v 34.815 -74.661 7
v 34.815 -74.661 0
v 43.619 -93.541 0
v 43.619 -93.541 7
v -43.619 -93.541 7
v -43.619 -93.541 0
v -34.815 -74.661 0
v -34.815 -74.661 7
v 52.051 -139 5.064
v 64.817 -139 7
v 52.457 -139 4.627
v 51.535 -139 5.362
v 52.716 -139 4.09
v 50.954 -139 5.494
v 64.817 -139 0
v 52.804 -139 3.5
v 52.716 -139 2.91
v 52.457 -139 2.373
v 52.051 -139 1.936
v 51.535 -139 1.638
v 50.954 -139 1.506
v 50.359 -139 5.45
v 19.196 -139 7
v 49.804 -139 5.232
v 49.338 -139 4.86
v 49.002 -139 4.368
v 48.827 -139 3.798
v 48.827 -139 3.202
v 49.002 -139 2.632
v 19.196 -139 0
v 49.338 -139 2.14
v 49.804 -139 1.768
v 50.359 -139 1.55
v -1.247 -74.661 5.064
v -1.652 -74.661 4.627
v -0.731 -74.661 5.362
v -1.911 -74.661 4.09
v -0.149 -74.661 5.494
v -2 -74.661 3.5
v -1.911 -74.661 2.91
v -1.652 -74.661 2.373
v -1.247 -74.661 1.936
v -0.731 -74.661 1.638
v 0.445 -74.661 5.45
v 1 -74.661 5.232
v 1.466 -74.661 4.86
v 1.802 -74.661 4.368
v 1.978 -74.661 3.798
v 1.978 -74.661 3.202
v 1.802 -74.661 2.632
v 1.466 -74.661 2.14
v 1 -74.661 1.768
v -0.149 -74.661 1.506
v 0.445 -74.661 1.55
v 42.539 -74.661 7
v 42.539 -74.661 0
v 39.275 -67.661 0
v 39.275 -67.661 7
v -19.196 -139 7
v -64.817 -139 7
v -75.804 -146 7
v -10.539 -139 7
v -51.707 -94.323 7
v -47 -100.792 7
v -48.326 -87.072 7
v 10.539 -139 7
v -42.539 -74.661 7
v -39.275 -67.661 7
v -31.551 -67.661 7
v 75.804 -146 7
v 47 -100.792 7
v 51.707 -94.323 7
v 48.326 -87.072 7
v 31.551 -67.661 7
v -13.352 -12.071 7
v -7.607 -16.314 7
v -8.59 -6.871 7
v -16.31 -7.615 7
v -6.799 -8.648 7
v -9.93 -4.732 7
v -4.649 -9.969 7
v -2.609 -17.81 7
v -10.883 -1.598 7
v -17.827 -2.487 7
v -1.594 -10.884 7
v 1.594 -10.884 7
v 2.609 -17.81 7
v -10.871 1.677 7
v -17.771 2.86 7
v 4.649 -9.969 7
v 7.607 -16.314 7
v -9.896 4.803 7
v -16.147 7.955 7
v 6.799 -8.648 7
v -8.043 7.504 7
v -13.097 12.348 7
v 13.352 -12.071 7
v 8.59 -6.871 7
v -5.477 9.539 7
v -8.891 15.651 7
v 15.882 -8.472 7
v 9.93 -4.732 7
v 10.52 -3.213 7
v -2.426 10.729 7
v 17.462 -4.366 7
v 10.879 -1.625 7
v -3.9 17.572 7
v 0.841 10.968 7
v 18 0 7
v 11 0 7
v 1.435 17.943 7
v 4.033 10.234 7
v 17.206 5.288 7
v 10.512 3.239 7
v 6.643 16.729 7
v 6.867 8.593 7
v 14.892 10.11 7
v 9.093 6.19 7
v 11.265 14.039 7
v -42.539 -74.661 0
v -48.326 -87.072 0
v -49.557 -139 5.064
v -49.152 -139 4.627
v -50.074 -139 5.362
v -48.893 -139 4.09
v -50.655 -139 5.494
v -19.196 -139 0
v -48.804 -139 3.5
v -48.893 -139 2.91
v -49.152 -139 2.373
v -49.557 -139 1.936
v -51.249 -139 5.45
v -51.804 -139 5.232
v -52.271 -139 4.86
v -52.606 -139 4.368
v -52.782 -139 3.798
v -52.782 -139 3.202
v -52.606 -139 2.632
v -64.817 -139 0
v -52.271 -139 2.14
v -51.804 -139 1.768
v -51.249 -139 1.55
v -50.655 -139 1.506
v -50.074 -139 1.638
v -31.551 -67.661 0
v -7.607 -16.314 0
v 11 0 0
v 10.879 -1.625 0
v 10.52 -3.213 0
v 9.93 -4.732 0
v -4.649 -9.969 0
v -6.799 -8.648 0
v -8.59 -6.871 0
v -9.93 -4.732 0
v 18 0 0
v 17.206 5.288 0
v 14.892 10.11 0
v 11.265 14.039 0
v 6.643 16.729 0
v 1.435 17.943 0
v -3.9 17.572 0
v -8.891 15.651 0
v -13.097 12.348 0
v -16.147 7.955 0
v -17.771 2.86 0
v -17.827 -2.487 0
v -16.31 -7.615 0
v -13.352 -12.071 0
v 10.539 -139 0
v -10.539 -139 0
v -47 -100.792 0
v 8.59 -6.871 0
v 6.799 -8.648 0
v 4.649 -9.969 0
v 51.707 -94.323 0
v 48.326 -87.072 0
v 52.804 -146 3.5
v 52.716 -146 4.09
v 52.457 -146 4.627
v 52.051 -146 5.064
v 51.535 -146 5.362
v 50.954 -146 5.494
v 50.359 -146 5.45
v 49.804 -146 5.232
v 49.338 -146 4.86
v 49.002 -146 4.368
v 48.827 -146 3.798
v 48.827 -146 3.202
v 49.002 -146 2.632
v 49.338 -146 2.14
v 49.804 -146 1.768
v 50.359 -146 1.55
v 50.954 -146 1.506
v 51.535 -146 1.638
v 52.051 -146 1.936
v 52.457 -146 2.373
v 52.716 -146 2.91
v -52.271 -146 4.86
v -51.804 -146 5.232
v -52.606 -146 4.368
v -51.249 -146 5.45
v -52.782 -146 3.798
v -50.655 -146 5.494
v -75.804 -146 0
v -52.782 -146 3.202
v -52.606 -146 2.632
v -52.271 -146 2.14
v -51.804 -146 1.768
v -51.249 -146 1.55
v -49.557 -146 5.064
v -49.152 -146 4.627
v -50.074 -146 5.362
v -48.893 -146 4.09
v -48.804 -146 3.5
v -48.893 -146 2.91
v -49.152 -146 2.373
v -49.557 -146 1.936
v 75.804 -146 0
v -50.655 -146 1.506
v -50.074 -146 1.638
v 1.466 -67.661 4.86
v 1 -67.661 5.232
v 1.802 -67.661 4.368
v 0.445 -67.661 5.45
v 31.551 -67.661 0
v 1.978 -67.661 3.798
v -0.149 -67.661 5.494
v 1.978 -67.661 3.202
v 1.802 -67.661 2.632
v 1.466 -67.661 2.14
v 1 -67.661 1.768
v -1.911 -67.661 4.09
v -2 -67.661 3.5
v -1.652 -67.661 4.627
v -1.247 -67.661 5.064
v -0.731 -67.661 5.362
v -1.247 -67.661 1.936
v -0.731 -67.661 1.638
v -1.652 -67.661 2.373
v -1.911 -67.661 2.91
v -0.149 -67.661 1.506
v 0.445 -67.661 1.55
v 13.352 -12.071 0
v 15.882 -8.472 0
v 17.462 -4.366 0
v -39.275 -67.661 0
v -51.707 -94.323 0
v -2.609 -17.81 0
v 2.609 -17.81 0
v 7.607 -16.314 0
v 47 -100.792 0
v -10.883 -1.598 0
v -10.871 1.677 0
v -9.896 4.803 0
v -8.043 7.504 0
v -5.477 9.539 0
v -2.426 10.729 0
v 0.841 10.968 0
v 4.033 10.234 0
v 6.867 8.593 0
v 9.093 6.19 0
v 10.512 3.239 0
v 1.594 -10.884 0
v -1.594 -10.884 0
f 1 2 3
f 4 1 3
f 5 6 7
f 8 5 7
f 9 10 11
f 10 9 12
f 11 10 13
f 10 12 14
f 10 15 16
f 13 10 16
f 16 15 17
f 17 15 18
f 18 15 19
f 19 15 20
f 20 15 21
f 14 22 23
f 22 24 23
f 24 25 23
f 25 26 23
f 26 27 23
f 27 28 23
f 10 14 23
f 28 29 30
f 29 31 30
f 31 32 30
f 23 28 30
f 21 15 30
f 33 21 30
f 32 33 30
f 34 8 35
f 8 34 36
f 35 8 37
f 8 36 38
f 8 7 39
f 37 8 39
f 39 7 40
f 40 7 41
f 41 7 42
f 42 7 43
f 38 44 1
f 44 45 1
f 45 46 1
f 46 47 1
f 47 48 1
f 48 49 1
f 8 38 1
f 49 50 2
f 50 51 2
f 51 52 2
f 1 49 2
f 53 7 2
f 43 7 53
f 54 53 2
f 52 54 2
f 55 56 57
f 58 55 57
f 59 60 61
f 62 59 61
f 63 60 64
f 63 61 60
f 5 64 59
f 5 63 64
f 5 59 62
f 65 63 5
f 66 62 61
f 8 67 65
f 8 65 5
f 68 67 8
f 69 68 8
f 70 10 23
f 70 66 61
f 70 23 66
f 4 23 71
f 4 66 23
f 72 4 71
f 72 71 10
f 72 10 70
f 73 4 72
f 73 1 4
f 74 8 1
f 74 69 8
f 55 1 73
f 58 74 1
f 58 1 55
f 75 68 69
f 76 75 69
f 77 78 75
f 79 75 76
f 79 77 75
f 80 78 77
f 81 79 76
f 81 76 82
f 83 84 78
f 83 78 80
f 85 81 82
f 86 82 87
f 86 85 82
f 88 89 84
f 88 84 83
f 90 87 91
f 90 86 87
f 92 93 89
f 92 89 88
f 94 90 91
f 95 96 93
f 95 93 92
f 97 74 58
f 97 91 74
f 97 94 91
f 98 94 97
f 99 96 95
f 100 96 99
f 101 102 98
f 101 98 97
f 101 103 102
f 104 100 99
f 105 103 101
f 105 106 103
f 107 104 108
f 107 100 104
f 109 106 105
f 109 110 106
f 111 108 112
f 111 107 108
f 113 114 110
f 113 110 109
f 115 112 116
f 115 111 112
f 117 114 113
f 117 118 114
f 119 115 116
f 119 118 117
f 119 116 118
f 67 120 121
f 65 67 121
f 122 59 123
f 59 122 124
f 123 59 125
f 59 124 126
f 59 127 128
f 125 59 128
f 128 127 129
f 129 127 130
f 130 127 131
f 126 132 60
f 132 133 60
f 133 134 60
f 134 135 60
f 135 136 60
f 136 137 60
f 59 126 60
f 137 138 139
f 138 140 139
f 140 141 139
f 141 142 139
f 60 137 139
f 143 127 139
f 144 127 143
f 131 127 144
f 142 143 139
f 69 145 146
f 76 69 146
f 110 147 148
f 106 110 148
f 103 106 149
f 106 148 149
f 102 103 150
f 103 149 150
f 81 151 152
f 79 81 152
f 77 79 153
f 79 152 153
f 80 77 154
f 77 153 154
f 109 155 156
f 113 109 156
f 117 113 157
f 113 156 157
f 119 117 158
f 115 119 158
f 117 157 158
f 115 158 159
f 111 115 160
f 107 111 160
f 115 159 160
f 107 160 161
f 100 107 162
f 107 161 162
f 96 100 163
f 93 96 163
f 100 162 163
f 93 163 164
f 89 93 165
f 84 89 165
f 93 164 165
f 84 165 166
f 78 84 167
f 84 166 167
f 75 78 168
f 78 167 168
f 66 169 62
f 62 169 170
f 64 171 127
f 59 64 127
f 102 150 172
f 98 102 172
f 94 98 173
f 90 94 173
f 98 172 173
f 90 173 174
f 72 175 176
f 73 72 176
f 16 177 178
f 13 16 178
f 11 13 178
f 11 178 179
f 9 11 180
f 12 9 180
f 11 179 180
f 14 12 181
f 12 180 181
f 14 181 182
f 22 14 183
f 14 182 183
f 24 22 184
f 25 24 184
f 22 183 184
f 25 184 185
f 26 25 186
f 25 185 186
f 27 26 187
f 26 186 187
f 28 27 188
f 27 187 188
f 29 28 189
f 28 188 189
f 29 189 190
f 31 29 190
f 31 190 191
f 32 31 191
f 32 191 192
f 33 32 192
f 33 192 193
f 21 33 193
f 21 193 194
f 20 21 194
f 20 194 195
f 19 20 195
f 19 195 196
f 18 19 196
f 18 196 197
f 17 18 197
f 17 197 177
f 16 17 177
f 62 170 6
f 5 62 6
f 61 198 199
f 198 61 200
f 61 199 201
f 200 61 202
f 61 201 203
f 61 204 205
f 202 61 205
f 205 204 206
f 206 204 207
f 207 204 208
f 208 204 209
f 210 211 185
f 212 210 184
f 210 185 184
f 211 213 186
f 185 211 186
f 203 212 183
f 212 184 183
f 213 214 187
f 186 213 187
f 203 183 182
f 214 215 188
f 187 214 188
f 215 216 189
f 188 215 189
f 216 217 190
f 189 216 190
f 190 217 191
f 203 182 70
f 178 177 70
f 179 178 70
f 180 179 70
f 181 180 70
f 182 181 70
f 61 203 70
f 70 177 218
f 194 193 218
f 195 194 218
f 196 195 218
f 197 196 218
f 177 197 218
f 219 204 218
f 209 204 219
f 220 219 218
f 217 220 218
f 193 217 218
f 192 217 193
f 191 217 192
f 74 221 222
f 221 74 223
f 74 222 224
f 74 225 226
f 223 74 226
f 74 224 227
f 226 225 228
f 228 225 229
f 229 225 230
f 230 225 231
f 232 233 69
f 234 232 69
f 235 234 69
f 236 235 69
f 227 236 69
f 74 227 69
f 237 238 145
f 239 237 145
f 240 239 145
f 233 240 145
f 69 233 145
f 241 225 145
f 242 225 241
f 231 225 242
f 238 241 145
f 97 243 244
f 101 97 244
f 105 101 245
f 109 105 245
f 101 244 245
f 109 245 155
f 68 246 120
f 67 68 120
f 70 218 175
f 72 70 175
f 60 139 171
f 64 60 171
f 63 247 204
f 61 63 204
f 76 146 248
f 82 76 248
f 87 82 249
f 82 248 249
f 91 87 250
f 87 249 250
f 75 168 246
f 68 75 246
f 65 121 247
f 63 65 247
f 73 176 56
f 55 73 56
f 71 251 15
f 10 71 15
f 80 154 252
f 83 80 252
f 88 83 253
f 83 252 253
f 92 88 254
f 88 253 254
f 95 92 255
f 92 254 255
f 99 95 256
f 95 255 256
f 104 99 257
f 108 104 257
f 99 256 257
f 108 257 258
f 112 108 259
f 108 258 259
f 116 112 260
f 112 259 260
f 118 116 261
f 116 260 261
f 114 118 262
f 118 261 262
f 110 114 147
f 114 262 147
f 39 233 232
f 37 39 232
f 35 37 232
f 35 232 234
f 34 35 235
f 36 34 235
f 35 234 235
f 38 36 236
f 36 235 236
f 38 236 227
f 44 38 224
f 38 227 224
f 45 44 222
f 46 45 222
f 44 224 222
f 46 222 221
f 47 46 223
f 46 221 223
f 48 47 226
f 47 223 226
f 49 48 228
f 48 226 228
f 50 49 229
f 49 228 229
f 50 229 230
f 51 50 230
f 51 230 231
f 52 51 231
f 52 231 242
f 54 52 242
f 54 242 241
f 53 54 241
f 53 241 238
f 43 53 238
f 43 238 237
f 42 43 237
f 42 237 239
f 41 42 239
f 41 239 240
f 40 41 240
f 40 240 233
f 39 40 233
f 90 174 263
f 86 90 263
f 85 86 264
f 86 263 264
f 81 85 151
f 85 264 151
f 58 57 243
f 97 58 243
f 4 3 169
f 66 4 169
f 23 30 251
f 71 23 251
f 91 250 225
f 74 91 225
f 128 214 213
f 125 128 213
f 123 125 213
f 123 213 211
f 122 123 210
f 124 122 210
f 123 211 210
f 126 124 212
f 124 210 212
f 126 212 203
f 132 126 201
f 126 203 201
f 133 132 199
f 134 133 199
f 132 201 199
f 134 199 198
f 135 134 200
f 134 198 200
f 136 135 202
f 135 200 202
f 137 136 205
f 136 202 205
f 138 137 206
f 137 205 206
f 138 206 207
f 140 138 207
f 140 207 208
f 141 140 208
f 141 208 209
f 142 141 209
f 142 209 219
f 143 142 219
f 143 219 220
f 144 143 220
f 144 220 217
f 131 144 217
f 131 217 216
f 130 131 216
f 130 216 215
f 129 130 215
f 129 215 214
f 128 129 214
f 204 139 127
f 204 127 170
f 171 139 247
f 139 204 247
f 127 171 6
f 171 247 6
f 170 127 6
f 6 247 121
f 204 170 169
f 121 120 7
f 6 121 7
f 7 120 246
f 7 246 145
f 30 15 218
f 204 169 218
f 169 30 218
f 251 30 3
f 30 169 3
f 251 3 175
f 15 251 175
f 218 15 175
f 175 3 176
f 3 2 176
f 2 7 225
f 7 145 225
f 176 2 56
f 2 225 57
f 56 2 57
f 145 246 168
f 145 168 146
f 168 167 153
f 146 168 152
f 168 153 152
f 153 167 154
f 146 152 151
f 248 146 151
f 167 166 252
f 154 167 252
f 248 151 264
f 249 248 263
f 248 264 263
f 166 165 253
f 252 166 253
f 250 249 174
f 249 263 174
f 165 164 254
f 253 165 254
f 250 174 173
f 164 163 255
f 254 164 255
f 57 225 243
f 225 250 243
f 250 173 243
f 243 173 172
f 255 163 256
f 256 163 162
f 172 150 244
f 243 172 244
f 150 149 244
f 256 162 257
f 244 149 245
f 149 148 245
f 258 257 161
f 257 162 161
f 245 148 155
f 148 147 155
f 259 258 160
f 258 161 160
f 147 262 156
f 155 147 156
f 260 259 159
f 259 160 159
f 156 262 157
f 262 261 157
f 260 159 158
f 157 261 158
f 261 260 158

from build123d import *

# Parameters (mm, degrees)
F1_DEPTH = 7
F2_R     = 2
F3_DEPTH = 8
F4_R     = 2
F5_DEPTH = 8


# Not quite as in the source:
# - a feature names something its author has since deleted; it is built from what else it names


with BuildPart() as f1:
    # F0 (on Top) → F1 (new body)
    with BuildSketch(Plane.XY):
        with BuildLine():
            ThreePointArc((9.930189374, -4.7319487525), (7.7456068538, -7.8106065364), (4.6488008791, -9.9693856574))
            Line((4.6488008791, -9.9693856574), (7.6071287113, -16.3135401667))
            ThreePointArc((7.6071287113, -16.3135401667), (10.6923318533, -14.4801256741), (13.352485528, -12.0710865387))
            Line((13.352485528, -12.0710865387), (9.930189374, -4.7319487525))
        make_face()
        with BuildLine():
            Line((7.6071287113, -16.3135401667), (4.6488008791, -9.9693856574))
            ThreePointArc((4.6488008791, -9.9693856574), (0, -11), (-4.6488008791, -9.9693856574))
            Line((-4.6488008791, -9.9693856574), (-7.6071287113, -16.3135401667))
            ThreePointArc((-7.6071287113, -16.3135401667), (0, -18), (7.6071287113, -16.3135401667))
        make_face()
        with BuildLine():
            Line((-7.6071287113, -16.3135401667), (-4.6488008791, -9.9693856574))
            ThreePointArc((-4.6488008791, -9.9693856574), (-7.7456068538, -7.8106065364), (-9.930189374, -4.7319487525))
            Line((-9.930189374, -4.7319487525), (-13.352485528, -12.0710865387))
            ThreePointArc((-13.352485528, -12.0710865387), (-10.6923318533, -14.4801256741), (-7.6071287113, -16.3135401667))
        make_face()
        with BuildLine():
            ThreePointArc((13.352485528, -12.0710865387), (10.6923318533, -14.4801256741), (7.6071287113, -16.3135401667))
            Line((7.6071287113, -16.3135401667), (31.5509050579, -67.6611342449))
            Line((31.5509050579, -67.6611342449), (39.2745504906, -67.6611342449))
            Line((39.2745504906, -67.6611342449), (13.352485528, -12.0710865387))
        make_face()
        with BuildLine():
            ThreePointArc((11, 0), (10.7292143961, -2.4256872104), (9.930189374, -4.7319487525))
            Line((9.930189374, -4.7319487525), (13.352485528, -12.0710865387))
            ThreePointArc((13.352485528, -12.0710865387), (16.7979870744, -6.4674284107), (18, 0))
            ThreePointArc((18, 0), (-6.4674284107, 16.7979870744), (-13.352485528, -12.0710865387))
            Line((-13.352485528, -12.0710865387), (-9.930189374, -4.7319487525))
            ThreePointArc((-9.930189374, -4.7319487525), (-2.4256872104, 10.7292143961), (11, 0))
        make_face()
        with BuildLine():
            Line((-31.5509050579, -67.6611342449), (-7.6071287113, -16.3135401667))
            ThreePointArc((-7.6071287113, -16.3135401667), (-10.6923318533, -14.4801256741), (-13.352485528, -12.0710865387))
            Line((-13.352485528, -12.0710865387), (-39.2745504906, -67.6611342449))
            Line((-39.2745504906, -67.6611342449), (-31.5509050579, -67.6611342449))
        make_face()
        Polygon((39.2745504906, -67.6611342449), (31.5509050579, -67.6611342449), (34.8150586649, -74.6611342449), (42.5387040977, -74.6611342449), align=None)
        Polygon((34.8150586649, -74.6611342449), (31.5509050579, -67.6611342449), (-31.5509050579, -67.6611342449), (-34.8150586649, -74.6611342449), align=None)
        Polygon((-34.8150586649, -74.6611342449), (-31.5509050579, -67.6611342449), (-39.2745504906, -67.6611342449), (-42.5387040977, -74.6611342449), align=None)
        Polygon((42.5387040977, -74.6611342449), (34.8150586649, -74.6611342449), (43.6188979632, -93.5410285471), (48.3261309802, -87.0723112465), align=None)
        Polygon((-43.6188979632, -93.5410285471), (-34.8150586649, -74.6611342449), (-42.5387040977, -74.6611342449), (-48.3261309802, -87.0723112465), align=None)
        Polygon((48.3261309802, -87.0723112465), (43.6188979632, -93.5410285471), (46.9999060281, -100.7916237405), (51.7071390451, -94.3229064398), align=None)
        Polygon((46.9999060281, -100.7916237405), (43.6188979632, -93.5410285471), (10.5389814088, -138.9997147322), (19.1961886798, -138.9997147322), align=None)
        Polygon((-10.5389814088, -138.9997147322), (-43.6188979632, -93.5410285471), (-46.9999060281, -100.7916237405), (-19.1961886798, -138.9997147322), align=None)
        Polygon((-46.9999060281, -100.7916237405), (-43.6188979632, -93.5410285471), (-48.3261309802, -87.0723112465), (-51.7071390451, -94.3229064398), align=None)
        Polygon((51.7071390451, -94.3229064398), (46.9999060281, -100.7916237405), (64.816631461, -138.9997147322), (19.1961886798, -138.9997147322), (14.1023455596, -145.9997147322), (75.8044305008, -145.9997147322), align=None)
        Polygon((19.1961886798, -138.9997147322), (10.5389814088, -138.9997147322), (5.4451382885, -145.9997147322), (14.1023455596, -145.9997147322), align=None)
        Polygon((5.4451382885, -145.9997147322), (10.5389814088, -138.9997147322), (-10.5389814088, -138.9997147322), (-5.4451382885, -145.9997147322), align=None)
        Polygon((-64.816631461, -138.9997147322), (-46.9999060281, -100.7916237405), (-51.7071390451, -94.3229064398), (-75.8044305008, -145.9997147322), (-14.1023455596, -145.9997147322), (-19.1961886798, -138.9997147322), align=None)
        Polygon((-5.4451382885, -145.9997147322), (-10.5389814088, -138.9997147322), (-19.1961886798, -138.9997147322), (-14.1023455596, -145.9997147322), align=None)
    extrude(amount=F1_DEPTH)

    # F2 (on face) → F3 (cut)
    with BuildSketch(Plane(origin=(0, -67.6611342449, 0), x_dir=(-1, 0, 0), z_dir=(0, 1, 0))):
        with Locations((0, 3.5)):
            Circle(F2_R)
    extrude(amount=-F3_DEPTH, mode=Mode.SUBTRACT)

    # F4 (on face) → F5 (cut)
    with BuildSketch(Plane.XZ.offset(145.9997147322)):
        with Locations((-50.8044305008, 3.5)):
            Circle(F4_R)
        with Locations((50.8044305008, 3.5)):
            Circle(F4_R)
    extrude(amount=-F5_DEPTH, mode=Mode.SUBTRACT)


solid = f1.part
